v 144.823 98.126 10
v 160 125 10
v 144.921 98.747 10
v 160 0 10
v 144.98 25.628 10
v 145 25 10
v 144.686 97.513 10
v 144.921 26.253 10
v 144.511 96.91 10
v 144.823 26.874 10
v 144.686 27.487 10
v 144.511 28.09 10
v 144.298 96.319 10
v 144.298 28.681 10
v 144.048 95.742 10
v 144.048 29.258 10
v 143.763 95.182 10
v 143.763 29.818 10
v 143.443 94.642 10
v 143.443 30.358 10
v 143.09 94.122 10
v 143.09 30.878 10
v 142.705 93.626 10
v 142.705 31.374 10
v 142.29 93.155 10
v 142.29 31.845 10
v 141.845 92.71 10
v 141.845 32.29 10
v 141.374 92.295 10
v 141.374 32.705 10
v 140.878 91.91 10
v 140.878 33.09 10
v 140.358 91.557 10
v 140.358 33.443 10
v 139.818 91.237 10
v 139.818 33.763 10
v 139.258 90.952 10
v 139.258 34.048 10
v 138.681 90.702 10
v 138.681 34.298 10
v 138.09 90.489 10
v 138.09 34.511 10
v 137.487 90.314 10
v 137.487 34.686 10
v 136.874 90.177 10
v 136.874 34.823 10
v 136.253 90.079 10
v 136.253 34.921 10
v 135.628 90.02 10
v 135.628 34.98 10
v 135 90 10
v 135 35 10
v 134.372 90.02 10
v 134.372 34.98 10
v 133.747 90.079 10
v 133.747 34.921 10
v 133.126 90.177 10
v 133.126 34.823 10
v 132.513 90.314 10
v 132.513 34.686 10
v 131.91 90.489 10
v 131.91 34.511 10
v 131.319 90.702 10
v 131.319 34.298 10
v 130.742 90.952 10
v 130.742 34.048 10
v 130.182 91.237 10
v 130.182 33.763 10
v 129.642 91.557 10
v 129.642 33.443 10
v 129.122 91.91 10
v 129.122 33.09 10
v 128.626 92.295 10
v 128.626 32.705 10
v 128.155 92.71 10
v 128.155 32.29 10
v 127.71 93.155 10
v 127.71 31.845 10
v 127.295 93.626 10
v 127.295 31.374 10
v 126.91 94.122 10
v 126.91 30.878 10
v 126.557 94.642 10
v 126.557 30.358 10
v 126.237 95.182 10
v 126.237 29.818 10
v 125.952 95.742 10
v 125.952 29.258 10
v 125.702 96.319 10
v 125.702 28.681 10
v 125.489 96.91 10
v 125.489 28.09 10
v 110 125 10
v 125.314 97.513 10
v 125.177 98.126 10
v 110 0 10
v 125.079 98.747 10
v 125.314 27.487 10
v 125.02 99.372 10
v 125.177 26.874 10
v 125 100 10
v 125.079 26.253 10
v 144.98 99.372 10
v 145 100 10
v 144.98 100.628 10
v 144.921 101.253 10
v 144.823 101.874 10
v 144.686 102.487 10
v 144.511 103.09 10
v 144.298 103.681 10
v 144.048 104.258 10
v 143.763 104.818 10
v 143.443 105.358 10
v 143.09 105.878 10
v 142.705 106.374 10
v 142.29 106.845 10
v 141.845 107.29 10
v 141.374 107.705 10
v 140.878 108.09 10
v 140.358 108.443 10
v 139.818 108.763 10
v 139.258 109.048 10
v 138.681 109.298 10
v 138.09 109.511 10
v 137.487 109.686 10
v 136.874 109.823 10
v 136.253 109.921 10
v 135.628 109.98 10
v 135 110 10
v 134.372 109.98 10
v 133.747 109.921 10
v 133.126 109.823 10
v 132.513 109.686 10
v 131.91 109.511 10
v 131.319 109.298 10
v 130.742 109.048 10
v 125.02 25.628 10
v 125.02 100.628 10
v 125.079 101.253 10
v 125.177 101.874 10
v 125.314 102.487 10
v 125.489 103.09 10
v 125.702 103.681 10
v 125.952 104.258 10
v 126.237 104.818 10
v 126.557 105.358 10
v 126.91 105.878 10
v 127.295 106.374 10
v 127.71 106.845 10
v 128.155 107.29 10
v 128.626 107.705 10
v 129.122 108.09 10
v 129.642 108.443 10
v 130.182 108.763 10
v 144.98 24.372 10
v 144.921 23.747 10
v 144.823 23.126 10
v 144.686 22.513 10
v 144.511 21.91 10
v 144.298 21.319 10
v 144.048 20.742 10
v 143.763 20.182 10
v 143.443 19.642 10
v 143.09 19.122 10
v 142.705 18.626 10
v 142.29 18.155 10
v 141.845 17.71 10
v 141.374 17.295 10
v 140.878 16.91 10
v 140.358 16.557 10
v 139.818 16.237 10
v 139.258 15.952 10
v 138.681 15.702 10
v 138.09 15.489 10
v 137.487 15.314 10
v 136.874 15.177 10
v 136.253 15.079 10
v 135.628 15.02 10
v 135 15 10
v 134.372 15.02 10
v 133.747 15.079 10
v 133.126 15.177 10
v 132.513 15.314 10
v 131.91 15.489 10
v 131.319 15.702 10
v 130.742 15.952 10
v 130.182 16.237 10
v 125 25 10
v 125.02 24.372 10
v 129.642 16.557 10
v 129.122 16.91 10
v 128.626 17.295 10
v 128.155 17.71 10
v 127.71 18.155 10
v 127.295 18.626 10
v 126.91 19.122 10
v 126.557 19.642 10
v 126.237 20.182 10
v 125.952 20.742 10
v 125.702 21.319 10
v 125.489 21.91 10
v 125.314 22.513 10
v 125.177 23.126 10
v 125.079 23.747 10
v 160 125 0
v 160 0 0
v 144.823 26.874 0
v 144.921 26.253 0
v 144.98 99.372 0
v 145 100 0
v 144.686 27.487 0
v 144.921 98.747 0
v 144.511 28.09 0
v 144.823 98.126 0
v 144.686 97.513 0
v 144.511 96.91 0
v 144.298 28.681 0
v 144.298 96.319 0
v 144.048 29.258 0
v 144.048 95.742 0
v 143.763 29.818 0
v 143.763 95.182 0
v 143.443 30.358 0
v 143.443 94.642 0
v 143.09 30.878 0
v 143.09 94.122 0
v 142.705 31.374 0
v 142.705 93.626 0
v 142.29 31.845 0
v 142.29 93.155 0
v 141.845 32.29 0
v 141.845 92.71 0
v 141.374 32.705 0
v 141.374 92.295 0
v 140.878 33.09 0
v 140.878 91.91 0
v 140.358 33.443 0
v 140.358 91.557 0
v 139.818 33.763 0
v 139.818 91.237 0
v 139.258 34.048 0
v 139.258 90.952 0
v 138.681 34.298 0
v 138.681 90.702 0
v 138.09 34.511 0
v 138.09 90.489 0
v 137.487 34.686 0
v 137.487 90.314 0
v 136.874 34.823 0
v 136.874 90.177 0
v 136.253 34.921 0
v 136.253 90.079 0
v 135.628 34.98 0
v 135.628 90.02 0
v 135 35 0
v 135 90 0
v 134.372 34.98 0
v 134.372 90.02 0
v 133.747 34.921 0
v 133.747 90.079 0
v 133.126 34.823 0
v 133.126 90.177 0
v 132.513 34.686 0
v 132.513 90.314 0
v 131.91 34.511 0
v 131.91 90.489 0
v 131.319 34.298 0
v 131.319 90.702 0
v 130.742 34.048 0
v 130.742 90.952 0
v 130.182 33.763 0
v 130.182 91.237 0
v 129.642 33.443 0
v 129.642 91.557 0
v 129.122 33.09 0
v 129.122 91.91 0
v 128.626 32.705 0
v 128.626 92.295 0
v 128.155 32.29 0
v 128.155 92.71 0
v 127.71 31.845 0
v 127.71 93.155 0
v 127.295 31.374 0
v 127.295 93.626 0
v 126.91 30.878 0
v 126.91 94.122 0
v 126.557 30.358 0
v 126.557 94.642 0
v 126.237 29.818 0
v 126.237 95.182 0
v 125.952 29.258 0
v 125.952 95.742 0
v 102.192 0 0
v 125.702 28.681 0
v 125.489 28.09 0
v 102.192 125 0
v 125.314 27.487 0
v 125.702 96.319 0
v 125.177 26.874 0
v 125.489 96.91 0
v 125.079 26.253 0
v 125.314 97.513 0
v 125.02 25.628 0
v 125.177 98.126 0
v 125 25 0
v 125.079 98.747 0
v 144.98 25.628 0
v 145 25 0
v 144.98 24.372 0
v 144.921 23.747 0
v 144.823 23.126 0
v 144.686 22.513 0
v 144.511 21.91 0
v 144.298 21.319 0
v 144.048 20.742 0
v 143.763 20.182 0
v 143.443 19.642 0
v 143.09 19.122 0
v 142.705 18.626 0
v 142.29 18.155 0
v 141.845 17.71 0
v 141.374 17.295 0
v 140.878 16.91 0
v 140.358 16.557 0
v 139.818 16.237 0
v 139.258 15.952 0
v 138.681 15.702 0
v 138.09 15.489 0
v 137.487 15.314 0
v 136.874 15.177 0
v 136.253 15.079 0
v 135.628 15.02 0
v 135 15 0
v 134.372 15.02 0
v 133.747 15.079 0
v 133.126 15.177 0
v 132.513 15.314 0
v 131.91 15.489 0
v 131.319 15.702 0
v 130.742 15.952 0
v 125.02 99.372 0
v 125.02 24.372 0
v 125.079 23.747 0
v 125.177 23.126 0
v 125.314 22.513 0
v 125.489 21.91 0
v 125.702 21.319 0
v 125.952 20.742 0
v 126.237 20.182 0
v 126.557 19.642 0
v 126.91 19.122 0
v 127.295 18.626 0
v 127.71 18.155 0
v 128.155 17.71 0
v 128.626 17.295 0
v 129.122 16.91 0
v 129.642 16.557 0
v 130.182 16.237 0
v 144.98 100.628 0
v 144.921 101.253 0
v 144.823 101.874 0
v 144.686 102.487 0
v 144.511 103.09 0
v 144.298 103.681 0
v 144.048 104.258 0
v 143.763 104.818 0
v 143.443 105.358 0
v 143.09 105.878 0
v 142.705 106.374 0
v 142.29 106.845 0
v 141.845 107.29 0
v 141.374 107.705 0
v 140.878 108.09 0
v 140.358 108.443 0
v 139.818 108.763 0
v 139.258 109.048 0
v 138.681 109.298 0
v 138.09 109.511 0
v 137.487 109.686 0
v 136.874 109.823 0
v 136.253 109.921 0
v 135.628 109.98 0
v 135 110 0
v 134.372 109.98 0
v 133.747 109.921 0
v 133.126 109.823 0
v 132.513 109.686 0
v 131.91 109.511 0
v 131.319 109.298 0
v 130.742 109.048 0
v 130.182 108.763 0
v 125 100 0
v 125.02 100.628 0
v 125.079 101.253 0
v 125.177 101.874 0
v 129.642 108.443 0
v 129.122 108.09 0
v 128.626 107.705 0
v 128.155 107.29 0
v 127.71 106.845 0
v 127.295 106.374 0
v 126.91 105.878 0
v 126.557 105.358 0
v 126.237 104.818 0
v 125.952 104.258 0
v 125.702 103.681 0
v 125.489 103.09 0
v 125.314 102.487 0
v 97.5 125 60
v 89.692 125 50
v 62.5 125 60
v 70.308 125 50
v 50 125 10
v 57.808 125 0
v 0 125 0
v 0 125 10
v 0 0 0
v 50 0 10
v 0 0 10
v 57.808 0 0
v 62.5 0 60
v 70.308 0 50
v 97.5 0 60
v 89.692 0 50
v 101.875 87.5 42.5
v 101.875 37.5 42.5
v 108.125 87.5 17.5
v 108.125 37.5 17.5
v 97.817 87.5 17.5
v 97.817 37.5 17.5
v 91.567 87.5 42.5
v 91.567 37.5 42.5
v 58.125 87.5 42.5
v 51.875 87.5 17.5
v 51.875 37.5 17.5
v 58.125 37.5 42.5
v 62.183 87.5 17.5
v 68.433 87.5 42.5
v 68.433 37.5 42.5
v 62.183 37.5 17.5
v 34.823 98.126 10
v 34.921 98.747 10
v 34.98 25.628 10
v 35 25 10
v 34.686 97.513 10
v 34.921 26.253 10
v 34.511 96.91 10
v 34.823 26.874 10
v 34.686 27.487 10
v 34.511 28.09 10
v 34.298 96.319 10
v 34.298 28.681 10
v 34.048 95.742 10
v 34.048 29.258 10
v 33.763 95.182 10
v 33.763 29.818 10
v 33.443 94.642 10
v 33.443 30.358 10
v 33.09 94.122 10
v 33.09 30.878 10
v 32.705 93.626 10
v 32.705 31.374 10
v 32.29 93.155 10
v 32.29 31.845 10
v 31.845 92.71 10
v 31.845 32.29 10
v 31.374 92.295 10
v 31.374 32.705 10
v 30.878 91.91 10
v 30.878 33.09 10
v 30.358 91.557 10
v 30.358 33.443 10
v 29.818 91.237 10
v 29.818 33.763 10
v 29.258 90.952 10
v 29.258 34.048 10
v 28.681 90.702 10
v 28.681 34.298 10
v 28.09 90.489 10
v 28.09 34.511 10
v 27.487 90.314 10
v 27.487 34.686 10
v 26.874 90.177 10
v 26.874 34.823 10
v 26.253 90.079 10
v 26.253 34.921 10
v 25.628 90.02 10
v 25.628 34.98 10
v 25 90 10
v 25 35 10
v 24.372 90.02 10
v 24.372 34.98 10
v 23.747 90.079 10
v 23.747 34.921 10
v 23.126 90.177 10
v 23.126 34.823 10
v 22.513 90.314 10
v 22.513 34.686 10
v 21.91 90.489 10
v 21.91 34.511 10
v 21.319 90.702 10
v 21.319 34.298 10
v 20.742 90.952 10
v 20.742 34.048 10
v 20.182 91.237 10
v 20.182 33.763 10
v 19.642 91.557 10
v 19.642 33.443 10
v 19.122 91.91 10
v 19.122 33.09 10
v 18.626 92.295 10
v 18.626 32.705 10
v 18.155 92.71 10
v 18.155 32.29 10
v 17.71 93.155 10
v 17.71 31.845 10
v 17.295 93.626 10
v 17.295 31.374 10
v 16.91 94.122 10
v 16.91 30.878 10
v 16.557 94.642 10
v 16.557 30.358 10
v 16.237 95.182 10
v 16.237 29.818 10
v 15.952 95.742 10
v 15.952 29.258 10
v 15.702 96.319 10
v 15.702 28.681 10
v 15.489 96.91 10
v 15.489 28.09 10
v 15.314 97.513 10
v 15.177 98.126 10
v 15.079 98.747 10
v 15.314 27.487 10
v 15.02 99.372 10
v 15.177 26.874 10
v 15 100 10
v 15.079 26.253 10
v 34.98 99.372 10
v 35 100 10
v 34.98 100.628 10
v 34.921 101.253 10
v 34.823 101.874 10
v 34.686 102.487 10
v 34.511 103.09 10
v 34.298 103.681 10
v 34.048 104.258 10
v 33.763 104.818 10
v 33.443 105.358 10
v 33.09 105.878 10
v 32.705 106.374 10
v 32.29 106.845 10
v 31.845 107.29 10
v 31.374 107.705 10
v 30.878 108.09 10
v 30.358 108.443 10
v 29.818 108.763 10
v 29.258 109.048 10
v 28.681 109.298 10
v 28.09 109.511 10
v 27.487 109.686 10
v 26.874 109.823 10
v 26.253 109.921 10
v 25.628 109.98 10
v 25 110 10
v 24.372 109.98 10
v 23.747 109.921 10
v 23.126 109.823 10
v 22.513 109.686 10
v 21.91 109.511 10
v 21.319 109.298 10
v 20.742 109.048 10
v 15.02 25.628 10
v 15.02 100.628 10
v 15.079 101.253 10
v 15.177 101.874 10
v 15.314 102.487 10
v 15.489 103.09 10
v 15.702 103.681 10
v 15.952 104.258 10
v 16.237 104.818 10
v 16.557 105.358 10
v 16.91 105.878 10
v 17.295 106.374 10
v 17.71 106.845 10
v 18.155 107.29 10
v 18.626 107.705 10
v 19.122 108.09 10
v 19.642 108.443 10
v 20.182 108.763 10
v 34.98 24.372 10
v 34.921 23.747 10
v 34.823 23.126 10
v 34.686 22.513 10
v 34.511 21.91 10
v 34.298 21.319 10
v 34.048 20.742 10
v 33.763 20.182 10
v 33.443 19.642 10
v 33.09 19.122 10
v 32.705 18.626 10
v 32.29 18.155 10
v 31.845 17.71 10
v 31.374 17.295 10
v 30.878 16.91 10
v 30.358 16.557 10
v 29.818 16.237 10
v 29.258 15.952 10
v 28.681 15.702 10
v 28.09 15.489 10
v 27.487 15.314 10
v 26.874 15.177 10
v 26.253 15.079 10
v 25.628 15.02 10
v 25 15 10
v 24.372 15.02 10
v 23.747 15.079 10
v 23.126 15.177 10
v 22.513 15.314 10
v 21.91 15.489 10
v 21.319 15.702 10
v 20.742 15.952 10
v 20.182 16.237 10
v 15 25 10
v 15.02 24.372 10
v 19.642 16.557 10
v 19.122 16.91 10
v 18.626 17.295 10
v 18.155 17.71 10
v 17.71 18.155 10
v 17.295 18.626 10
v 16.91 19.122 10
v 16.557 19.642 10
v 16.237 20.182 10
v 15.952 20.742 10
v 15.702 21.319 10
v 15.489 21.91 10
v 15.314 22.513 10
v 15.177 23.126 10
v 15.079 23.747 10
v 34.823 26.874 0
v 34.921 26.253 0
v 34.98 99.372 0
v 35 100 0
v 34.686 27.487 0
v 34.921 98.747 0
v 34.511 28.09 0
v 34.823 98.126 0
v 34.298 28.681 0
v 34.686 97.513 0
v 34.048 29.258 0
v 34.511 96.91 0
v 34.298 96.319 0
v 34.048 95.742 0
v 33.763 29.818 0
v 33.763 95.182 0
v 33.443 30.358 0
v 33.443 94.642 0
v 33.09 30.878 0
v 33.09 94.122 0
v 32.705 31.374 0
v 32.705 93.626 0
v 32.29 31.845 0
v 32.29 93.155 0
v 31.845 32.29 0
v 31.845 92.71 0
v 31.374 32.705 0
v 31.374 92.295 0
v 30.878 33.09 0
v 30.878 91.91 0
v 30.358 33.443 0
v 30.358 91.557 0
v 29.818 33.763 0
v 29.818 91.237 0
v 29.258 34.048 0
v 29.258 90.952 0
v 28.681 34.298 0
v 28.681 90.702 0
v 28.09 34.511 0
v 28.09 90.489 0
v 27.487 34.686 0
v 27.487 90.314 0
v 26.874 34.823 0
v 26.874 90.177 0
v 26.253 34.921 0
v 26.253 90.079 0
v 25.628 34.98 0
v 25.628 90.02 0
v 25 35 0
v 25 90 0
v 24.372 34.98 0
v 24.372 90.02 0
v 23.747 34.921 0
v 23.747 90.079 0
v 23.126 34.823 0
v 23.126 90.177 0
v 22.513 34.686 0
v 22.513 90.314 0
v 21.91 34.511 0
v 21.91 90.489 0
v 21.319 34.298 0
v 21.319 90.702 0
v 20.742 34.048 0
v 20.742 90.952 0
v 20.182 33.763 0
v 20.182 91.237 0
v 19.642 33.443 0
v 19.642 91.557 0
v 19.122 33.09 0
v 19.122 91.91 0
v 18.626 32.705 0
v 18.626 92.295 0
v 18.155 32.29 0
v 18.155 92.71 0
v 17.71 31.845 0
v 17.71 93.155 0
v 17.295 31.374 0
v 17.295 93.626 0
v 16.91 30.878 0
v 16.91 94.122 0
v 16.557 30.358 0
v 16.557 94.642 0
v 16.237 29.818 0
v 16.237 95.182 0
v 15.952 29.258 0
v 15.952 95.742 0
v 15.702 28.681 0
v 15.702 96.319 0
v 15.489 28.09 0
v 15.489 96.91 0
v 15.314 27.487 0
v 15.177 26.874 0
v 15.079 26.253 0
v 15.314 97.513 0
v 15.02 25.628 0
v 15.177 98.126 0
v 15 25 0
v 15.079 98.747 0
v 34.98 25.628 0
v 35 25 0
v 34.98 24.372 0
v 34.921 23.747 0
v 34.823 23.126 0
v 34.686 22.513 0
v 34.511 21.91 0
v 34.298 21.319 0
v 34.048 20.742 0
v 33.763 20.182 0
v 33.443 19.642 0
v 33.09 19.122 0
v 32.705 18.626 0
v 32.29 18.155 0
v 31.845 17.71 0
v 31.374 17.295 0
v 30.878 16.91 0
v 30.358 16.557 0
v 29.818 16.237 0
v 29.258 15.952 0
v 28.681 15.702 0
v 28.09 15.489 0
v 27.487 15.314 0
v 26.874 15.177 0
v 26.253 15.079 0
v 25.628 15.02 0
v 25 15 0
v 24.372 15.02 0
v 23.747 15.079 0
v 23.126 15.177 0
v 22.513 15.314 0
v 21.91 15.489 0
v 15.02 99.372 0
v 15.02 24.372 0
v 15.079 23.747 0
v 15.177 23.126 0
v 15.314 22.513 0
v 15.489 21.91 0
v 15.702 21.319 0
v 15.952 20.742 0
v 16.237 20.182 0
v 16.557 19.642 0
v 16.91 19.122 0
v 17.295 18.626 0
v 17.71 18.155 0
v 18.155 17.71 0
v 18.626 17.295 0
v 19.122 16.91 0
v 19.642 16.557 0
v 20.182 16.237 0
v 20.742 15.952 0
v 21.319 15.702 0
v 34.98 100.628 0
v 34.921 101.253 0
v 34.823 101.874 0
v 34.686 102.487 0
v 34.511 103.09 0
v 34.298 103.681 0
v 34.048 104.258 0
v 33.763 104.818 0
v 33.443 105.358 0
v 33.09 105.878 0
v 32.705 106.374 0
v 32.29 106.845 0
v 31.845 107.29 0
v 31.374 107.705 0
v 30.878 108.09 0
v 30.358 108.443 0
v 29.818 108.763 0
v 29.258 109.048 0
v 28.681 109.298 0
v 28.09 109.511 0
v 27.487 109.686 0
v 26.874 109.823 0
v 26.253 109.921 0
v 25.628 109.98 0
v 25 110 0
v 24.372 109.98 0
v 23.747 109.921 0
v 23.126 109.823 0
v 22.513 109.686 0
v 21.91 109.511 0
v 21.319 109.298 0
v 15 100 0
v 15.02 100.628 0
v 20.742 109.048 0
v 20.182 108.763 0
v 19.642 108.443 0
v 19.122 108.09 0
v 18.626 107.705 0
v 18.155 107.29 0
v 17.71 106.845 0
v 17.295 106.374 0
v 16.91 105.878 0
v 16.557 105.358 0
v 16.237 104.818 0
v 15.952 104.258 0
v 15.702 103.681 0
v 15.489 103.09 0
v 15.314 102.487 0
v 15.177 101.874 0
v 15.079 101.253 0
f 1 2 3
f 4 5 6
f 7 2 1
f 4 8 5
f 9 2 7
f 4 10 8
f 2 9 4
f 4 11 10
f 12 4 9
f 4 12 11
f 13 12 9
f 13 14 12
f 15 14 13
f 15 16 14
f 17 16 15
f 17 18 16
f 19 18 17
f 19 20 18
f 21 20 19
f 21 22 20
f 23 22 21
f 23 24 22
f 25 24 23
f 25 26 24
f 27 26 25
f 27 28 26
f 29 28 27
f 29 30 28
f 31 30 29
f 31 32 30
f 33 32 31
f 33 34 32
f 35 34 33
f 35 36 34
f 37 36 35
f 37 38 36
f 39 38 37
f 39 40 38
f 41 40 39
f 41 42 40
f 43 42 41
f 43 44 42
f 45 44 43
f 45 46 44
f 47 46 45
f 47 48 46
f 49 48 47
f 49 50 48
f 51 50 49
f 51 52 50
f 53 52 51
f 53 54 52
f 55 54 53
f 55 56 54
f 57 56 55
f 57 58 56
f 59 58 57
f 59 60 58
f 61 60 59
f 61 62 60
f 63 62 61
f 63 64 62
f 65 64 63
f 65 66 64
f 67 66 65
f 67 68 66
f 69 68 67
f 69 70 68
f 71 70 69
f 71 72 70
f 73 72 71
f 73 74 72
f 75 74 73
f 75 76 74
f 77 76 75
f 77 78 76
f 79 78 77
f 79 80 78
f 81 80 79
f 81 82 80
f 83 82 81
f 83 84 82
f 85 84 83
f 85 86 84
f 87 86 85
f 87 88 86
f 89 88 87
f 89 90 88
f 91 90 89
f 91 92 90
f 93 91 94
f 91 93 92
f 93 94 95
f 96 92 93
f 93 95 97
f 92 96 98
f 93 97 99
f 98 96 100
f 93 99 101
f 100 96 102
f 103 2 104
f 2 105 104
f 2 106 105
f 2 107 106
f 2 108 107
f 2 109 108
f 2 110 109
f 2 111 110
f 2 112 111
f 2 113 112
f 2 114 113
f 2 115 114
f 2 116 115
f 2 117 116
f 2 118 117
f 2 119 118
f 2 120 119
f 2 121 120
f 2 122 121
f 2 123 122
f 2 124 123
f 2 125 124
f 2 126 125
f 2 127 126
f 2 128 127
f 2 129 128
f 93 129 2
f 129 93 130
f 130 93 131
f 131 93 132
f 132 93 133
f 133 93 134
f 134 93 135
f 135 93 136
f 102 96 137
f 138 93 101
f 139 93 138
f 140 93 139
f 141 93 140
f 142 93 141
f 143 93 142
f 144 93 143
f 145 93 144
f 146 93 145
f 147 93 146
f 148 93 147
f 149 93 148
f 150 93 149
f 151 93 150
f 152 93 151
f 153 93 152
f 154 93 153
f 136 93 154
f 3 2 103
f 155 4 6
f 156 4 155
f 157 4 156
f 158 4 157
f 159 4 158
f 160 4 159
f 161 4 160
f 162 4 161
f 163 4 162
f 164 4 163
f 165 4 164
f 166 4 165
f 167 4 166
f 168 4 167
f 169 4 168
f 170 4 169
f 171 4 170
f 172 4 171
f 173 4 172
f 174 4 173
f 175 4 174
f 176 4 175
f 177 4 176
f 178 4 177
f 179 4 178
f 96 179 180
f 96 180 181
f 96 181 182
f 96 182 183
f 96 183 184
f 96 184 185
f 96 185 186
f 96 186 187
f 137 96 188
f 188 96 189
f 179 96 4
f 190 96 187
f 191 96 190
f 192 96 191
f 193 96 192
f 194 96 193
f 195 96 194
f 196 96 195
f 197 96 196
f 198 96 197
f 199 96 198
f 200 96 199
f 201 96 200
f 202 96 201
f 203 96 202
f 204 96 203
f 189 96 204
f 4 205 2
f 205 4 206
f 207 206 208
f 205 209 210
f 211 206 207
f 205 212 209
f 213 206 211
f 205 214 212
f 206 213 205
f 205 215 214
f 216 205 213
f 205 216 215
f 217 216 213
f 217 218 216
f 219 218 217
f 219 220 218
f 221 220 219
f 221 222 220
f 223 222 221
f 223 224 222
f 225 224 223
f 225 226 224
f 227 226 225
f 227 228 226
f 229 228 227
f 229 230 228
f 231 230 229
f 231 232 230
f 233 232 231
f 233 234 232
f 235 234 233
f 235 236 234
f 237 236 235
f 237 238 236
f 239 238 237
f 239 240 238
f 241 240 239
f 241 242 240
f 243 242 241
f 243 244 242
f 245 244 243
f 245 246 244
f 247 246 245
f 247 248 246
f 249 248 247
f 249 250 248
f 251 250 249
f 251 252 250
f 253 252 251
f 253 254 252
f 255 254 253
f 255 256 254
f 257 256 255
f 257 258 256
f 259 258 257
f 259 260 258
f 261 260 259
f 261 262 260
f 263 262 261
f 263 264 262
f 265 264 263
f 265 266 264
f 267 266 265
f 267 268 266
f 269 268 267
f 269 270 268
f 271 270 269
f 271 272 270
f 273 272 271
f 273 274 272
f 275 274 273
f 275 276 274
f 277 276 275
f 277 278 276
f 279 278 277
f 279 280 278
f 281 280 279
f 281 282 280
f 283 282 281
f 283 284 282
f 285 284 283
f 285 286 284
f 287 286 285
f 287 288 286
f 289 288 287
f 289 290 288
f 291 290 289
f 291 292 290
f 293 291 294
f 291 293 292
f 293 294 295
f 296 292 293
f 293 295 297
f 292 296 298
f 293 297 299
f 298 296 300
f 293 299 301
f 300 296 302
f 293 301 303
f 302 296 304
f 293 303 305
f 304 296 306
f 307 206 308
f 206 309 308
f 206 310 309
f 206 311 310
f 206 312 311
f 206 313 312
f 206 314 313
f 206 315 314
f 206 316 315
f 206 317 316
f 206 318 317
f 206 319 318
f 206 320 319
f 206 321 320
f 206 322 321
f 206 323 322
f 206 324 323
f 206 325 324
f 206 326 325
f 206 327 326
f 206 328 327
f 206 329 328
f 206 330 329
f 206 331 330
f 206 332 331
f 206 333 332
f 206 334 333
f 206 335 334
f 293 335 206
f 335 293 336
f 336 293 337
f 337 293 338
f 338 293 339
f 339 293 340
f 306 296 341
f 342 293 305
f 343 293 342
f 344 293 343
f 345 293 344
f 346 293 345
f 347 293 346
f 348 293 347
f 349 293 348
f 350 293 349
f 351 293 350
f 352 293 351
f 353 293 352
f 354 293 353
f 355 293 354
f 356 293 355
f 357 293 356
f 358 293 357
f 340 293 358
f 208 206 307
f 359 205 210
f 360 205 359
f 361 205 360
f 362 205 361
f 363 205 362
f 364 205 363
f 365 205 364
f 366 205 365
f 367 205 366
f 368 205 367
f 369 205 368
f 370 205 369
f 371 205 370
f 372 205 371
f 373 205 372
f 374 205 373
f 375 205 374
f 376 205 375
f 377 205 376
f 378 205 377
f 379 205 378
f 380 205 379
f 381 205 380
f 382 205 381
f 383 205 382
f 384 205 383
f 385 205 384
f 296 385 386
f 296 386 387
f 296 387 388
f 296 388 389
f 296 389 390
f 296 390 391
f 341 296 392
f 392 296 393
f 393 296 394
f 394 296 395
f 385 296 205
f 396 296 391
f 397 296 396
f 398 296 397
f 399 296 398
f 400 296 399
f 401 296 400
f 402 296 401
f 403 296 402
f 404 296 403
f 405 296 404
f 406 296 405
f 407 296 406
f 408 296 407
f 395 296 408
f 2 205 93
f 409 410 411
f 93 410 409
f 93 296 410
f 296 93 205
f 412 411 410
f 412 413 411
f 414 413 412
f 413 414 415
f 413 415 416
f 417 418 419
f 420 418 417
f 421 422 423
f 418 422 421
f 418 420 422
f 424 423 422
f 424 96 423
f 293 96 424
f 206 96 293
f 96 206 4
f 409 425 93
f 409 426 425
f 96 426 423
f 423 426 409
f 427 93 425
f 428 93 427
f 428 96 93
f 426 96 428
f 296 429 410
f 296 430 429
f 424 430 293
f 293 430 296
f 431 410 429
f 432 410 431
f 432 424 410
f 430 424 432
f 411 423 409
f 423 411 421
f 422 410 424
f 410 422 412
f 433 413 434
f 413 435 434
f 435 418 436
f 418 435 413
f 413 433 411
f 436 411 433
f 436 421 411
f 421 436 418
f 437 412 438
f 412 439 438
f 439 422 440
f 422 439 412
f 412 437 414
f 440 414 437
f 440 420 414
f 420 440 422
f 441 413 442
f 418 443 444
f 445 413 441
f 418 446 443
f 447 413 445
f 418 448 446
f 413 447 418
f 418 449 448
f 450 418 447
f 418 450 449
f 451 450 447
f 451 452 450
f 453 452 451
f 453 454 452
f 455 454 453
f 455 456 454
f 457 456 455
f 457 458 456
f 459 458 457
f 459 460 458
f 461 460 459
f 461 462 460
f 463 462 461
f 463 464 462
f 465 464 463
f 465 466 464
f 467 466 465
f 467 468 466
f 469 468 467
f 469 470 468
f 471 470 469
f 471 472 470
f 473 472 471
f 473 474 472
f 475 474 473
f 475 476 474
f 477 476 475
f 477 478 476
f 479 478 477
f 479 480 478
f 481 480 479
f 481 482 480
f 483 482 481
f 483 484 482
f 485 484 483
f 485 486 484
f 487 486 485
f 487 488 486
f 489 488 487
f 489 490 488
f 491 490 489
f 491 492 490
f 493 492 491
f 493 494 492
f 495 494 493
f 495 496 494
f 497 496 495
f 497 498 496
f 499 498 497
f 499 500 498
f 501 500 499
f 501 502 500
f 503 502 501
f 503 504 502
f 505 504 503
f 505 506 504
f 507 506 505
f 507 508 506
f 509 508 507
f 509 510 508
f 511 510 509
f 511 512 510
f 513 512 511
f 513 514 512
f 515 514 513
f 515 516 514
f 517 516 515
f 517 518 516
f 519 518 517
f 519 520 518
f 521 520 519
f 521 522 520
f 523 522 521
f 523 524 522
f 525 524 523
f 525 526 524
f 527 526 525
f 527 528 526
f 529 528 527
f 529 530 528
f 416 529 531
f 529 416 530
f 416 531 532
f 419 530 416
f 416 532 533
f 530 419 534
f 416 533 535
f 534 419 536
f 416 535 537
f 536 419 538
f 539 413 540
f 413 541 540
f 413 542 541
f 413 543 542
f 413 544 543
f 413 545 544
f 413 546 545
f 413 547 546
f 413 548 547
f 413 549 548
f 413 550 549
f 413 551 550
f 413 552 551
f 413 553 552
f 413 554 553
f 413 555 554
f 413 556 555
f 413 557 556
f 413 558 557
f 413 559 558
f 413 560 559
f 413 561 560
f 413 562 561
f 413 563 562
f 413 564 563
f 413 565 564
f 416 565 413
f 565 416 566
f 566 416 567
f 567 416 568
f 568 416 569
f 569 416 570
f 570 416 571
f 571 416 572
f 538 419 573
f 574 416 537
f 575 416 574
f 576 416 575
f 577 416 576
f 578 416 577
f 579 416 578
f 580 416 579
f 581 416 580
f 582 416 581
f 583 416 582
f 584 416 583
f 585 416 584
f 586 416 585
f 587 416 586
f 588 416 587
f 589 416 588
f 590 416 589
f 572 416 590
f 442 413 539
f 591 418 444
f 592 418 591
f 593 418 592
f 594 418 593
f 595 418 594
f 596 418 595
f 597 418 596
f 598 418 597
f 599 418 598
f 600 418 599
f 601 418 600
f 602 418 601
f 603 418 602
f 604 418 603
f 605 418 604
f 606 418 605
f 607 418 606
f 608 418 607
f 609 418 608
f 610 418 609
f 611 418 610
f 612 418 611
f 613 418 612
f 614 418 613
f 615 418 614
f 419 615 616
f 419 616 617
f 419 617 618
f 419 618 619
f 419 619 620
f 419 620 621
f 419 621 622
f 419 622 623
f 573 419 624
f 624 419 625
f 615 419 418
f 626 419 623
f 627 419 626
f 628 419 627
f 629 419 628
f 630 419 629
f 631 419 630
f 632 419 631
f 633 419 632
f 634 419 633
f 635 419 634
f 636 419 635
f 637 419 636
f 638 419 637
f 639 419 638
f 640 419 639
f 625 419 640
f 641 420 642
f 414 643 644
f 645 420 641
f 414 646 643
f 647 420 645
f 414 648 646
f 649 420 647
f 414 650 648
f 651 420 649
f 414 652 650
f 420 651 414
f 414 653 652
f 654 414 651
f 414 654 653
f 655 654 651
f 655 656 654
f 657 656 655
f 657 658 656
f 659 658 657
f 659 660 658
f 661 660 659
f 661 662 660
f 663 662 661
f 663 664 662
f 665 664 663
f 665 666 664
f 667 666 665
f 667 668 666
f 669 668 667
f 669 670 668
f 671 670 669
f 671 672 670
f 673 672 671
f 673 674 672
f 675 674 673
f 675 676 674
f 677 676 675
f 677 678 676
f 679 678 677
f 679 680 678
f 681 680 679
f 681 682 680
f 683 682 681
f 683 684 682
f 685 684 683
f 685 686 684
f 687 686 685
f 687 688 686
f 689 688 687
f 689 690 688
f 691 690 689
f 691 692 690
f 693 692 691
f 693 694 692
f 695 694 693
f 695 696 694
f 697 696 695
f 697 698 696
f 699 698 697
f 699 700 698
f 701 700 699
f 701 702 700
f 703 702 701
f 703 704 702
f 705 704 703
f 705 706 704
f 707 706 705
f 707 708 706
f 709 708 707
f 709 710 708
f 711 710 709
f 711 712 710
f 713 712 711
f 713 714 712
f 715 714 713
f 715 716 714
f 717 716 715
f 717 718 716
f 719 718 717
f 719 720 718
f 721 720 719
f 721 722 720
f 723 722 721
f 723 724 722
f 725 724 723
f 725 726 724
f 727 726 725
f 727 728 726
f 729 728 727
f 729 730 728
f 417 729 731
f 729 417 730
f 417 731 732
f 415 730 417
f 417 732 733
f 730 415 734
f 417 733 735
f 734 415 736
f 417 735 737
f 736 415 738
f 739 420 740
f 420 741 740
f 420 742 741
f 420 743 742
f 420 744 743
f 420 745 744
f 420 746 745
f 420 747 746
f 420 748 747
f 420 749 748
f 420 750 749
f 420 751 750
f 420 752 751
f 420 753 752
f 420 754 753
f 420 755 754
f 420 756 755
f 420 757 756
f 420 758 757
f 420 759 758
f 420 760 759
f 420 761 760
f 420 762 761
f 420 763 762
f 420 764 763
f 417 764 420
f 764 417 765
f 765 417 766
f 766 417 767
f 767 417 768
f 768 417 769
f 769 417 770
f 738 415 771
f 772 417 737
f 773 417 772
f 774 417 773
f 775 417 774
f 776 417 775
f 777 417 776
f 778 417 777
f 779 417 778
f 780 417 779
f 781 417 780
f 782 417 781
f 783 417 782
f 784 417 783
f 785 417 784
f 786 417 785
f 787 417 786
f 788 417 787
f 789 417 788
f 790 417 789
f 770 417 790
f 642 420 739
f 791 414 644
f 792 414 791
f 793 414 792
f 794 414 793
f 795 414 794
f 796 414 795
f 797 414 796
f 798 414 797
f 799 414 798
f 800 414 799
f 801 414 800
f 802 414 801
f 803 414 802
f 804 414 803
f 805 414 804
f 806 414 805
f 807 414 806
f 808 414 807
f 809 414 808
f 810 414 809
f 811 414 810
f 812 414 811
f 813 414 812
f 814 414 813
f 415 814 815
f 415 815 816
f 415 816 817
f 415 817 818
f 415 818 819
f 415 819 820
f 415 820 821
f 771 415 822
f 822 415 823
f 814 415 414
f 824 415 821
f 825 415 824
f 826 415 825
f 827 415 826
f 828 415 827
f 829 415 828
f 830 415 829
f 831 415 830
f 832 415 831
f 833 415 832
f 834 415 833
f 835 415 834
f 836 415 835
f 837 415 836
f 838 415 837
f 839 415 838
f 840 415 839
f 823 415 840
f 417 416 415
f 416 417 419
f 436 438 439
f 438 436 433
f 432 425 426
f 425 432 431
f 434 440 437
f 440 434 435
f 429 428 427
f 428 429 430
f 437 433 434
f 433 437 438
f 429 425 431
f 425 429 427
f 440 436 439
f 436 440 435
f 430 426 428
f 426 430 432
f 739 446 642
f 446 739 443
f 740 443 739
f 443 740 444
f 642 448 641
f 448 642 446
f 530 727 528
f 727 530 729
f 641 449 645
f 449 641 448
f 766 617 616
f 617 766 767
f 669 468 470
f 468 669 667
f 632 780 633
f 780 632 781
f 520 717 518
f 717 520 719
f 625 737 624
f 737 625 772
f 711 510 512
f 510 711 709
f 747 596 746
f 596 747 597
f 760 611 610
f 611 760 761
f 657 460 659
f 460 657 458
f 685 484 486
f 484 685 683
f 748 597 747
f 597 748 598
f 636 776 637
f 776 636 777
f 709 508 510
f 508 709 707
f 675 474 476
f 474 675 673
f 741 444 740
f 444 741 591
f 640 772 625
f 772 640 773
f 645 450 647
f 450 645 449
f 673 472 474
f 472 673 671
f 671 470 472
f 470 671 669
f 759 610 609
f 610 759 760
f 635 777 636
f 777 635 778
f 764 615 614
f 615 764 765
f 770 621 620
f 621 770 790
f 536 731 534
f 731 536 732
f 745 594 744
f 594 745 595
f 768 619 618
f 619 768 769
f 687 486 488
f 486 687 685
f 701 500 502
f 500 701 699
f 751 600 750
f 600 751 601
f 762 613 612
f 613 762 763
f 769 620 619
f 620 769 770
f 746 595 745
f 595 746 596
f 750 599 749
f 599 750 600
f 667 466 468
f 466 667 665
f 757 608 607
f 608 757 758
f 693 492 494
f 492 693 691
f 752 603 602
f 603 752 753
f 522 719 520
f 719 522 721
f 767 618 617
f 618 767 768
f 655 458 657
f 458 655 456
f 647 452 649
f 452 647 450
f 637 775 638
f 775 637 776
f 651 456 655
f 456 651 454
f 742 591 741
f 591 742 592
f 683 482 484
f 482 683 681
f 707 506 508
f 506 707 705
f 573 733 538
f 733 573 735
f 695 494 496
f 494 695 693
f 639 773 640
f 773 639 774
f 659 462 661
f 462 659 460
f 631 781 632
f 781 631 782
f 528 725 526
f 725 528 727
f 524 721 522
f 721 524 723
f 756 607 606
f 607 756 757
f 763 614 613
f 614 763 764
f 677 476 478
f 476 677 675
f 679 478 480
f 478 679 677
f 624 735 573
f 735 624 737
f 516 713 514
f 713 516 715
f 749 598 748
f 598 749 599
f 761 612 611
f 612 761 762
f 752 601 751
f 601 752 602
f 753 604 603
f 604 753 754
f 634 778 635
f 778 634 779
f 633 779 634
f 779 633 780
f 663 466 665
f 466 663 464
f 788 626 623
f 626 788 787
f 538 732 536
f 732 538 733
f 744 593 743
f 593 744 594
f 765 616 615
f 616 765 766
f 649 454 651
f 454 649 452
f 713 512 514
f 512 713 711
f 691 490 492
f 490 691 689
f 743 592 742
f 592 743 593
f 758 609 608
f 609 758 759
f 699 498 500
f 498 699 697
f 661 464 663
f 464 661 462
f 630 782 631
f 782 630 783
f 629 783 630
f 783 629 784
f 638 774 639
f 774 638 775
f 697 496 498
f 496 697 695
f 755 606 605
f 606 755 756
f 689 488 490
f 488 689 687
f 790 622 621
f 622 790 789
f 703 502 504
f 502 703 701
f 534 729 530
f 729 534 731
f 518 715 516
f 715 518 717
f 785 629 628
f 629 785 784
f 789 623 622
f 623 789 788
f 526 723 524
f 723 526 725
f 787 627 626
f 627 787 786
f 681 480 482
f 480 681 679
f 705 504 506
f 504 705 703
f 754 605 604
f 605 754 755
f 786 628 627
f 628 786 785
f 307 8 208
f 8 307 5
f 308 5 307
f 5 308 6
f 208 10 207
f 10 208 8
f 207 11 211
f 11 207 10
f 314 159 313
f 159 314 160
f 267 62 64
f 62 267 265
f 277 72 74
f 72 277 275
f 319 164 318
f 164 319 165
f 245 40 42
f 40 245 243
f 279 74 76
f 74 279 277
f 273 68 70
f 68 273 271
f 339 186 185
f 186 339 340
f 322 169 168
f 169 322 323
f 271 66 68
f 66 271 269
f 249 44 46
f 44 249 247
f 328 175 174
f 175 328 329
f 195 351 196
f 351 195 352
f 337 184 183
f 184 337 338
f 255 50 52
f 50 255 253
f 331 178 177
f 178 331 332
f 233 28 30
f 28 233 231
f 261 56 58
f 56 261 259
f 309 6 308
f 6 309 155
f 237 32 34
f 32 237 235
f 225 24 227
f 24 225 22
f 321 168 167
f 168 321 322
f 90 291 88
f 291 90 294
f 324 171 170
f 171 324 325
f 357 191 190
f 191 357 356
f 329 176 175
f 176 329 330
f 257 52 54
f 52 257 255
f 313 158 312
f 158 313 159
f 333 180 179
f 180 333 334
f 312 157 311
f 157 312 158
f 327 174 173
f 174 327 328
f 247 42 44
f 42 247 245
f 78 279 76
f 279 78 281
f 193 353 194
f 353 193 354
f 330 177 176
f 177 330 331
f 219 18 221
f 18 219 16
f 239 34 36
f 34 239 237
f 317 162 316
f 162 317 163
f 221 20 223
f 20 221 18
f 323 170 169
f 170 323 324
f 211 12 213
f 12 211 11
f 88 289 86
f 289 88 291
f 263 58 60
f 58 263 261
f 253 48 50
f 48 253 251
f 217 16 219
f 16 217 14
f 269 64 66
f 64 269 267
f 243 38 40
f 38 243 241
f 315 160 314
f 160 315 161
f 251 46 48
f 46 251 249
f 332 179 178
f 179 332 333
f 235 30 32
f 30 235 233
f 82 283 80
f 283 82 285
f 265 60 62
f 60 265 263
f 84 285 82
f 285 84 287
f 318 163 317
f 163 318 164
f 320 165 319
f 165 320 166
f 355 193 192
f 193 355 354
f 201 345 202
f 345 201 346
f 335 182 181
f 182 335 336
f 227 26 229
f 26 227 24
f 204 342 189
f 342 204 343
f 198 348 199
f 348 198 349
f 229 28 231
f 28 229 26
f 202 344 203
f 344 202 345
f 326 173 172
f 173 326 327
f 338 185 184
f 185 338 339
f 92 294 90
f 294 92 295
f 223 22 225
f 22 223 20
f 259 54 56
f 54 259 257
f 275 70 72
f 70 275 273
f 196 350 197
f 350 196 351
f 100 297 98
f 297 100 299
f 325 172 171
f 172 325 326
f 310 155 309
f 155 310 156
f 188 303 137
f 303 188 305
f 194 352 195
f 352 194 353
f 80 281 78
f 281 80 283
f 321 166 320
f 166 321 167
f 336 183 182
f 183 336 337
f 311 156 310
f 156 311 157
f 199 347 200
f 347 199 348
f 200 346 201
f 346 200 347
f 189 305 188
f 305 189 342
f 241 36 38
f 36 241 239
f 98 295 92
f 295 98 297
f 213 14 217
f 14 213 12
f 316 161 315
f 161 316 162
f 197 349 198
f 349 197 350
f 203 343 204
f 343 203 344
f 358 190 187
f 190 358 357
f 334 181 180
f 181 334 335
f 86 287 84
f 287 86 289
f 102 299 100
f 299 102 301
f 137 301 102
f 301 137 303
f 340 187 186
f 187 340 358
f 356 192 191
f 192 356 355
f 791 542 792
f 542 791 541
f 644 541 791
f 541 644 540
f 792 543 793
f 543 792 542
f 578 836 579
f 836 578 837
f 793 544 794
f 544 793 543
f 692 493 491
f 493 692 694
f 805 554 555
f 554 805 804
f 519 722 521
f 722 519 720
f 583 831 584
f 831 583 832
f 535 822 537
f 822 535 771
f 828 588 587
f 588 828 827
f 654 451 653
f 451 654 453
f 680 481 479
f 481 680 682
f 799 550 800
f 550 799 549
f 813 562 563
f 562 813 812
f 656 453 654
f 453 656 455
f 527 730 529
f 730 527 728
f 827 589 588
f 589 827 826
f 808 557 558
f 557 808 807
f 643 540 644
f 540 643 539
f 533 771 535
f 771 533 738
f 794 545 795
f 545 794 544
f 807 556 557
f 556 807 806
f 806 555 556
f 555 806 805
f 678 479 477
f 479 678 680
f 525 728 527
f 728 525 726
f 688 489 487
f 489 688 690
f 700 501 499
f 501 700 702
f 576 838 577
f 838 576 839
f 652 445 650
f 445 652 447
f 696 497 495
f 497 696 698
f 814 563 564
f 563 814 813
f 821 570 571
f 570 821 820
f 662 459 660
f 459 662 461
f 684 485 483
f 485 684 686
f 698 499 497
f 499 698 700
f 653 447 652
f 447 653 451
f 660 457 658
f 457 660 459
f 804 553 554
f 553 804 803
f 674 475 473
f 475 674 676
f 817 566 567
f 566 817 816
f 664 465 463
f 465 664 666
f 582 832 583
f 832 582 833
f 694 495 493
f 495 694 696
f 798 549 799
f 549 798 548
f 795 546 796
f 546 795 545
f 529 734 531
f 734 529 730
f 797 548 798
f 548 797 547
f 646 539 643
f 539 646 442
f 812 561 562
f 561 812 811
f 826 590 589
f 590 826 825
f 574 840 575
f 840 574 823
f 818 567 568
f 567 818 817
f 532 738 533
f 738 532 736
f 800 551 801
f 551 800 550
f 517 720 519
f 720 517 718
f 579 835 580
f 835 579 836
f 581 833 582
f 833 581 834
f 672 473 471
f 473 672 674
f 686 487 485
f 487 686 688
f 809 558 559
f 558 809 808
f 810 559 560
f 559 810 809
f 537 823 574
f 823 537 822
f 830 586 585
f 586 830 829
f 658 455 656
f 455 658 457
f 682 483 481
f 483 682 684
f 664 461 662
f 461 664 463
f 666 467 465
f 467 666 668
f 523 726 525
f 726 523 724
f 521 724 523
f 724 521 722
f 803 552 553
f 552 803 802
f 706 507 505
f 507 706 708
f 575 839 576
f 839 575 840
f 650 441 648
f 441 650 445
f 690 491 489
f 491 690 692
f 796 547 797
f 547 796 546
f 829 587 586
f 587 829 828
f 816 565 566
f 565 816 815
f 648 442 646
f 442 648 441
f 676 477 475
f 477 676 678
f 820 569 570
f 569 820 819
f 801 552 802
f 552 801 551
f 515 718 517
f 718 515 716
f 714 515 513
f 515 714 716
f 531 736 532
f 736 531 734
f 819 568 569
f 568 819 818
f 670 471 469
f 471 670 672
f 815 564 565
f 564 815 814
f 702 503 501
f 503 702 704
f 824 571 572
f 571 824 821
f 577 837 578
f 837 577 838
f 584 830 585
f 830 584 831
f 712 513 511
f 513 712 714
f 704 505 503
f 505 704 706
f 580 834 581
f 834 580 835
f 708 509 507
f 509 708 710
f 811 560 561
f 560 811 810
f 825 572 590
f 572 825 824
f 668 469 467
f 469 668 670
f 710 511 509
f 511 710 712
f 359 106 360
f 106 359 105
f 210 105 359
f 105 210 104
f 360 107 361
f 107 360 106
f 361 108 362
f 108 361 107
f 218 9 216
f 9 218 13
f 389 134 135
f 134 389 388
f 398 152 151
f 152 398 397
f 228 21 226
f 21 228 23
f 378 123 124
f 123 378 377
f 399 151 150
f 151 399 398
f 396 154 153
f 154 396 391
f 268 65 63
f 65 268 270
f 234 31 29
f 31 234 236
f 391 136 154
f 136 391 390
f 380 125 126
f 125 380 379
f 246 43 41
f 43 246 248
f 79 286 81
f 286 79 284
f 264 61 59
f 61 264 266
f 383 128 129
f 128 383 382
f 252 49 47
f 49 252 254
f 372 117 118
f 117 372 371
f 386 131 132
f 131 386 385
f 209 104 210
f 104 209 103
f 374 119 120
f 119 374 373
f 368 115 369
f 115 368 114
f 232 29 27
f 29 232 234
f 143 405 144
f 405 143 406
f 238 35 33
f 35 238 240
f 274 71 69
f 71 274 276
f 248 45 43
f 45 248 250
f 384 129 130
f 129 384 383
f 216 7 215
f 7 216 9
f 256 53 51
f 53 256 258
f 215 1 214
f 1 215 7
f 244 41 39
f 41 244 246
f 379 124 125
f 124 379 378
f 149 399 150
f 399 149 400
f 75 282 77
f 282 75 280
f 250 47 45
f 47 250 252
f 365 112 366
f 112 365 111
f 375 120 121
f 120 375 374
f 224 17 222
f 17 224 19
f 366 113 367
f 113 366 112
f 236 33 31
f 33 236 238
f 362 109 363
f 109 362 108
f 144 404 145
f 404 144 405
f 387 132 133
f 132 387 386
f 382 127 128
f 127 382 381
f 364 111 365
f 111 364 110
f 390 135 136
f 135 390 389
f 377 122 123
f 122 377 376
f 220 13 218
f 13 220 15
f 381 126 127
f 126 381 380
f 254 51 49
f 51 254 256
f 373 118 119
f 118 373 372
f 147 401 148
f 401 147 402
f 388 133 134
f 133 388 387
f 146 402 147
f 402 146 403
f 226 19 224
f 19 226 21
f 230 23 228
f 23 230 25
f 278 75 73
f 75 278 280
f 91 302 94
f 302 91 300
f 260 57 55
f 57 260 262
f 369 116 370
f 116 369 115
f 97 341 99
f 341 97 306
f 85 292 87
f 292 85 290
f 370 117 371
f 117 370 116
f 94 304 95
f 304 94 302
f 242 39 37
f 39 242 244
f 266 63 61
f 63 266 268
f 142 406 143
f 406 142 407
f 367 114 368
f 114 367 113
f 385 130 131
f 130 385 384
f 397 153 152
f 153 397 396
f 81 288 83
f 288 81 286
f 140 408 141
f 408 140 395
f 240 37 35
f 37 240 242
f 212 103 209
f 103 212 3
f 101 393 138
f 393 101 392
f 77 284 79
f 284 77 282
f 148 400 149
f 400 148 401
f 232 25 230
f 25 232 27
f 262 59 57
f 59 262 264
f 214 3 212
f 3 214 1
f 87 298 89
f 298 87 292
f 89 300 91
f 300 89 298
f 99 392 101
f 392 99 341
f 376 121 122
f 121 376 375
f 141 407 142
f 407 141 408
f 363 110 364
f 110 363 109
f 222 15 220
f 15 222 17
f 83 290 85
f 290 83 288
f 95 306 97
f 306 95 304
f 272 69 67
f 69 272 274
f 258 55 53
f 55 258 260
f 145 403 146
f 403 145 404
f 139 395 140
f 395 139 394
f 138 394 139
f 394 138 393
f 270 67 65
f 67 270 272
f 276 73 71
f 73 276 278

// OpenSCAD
$fn=100;
mm=1; // define units
degrees=1;

include <lib.scad>

function add(list1,list2,sum=[])=
     assert(list1!=undef)
     assert(list2!=undef)
     assert(sum !=undef)
     len(list1)==0
     ?concat(sum,list2)
     :len(list2)==0
      ?concat(sum,list1)
      :add(pop(list1),pop(list2),concat(sum,[list1[0]+list2[0]]));

module bent_plate(list,thickness,width,sirface="middle"){
     assert(sirface=="top","Other modes are TODO");
     assert(len(list)>0,"List needs to be an odd length.");
     T=unique([thickness],"Thickness required.");
     if(len(list)>1){
	  assert(len(list)>2,"Invalid input.");
	  assert(list[1]<=90 && list[1]>=-90,"Angles larger than 90 are TODO.");
	  // TODO: Turn the paper workings into some documenation for this.
	  I=sin(abs(list[1]))*T;
	  r=T*(1-cos(list[1]));
	  O=I-r/tan(abs(list[1]));
	  L=r/sin(abs(list[1]));
	  if(list[1]>0){
	       translate((list[0]+O)*X){
		    rotate(-list[1]*Y){
			 bent_plate(add(pop(pop(list)),
					[L]),
				    thickness,
				    width,
				    sirface);}}
	       Cube([list[0]+O,width,thickness]);}
	  else{
	       translate(r*Z-I*X){
		    translate(list[0]*X){
			 rotate(-list[1]*Y){
			      bent_plate(pop(pop(list)),
					 thickness,
					 width,
					 sirface);}}}
	       Cube([list[0],width,thickness]);}}
     else{
	  Cube([list[0],width,thickness]);}}

module example_129(){
     width=125;
     length=160;
     height=60;
     thickness=10;
     module holes(){
	  inset=25;
	  translate(inset*(X+Y)){
	  grid([(width-inset*2)*Y,(length-inset*2)*X]){
	       wcylinder(h=thickness,r=10);}}}
     module plate(){
	  difference(){
	       plate_angle=atan(50/12.5);
	       plate_up_length=50/sin(plate_angle);
	       bent_plate([50,
			   plate_angle,plate_up_length,
			   -plate_angle,35,
			   -plate_angle,plate_up_length,
			   plate_angle,50],
			  thickness=thickness,
			  width=width,
			  sirface="top");
	       translate(width/2*Y+height/2*Z)
		    Cube([length,50,25],center=Y+Z);}}
     difference(){
	  plate();
	  holes();}
}

example_129();
